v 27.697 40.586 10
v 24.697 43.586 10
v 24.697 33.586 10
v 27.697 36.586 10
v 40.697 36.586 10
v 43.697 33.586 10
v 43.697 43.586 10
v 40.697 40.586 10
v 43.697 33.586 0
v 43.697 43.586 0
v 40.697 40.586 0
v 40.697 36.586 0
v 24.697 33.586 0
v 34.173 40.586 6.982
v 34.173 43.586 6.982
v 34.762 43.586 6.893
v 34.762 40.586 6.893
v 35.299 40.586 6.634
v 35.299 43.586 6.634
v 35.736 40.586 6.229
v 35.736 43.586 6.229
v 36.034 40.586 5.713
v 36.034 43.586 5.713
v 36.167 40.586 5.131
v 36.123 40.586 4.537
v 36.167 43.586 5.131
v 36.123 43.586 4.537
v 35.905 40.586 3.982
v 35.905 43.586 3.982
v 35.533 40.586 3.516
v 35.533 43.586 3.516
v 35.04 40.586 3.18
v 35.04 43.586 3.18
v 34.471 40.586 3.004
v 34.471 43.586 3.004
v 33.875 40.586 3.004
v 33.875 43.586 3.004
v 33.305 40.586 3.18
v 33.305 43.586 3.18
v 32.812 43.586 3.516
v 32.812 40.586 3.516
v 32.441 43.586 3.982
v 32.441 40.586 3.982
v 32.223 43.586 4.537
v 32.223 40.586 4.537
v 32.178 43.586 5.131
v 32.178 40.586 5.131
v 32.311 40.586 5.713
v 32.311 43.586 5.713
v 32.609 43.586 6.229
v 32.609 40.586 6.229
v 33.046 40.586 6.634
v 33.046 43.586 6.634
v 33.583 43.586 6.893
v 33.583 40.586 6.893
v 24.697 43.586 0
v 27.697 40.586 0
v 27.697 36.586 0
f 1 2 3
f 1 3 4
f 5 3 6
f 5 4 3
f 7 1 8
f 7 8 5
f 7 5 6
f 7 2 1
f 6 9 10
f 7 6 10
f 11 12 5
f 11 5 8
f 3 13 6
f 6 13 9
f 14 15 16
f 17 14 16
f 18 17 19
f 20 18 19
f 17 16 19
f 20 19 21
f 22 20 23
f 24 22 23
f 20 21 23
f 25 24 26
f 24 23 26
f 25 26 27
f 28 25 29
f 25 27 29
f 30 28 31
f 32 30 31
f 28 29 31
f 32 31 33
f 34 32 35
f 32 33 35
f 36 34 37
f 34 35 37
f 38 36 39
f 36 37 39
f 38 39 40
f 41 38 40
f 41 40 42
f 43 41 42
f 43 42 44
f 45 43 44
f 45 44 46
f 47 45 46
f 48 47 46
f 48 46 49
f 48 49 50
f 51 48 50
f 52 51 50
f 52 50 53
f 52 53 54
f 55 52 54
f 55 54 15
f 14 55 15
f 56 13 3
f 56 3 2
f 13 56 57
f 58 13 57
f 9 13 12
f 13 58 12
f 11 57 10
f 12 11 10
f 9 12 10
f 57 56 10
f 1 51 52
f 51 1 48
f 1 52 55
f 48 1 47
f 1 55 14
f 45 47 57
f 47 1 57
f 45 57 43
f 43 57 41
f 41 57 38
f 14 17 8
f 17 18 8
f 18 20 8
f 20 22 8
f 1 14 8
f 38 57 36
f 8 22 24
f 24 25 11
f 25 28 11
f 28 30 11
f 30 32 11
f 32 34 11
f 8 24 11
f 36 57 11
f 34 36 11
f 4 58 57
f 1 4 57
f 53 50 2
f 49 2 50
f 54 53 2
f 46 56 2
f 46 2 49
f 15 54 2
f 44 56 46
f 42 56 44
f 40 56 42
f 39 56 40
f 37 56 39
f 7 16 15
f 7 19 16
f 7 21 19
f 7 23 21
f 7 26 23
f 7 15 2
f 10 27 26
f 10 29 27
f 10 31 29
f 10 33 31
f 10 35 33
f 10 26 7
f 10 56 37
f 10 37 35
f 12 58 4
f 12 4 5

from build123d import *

# Parameters (mm, degrees)
SKETCH3_W           = 19
SKETCH3_H           = 10
SKETCH3_W_2         = 13
SKETCH3_H_2         = 4
BOSS_EXTRUDE1_DEPTH = 10
SKETCH4_R           = 2
CUT_EXTRUDE1_DEPTH  = 4


with BuildPart() as part:
    # Sketch3 → Boss-Extrude1 (new body)
    with BuildSketch(Plane.XY):
        with Locations((34.196690887, 38.585532183)):
            Rectangle(SKETCH3_W, SKETCH3_H)
        with Locations((34.196690887, 38.585532183)):
            Rectangle(SKETCH3_W_2, SKETCH3_H_2, mode=Mode.SUBTRACT)
    extrude(amount=BOSS_EXTRUDE1_DEPTH)

    # Sketch4 → Cut-Extrude1 (cut)
    with BuildSketch(Plane(origin=(0, 43.585532183, 0), x_dir=(1, 0, 0), z_dir=(0, 1, 0))):
        with Locations(Location((34.172706418, -4.982011648, 0), (0, 0, 270))):
            Circle(SKETCH4_R)
    extrude(amount=-CUT_EXTRUDE1_DEPTH, mode=Mode.SUBTRACT)


solid = part.part
